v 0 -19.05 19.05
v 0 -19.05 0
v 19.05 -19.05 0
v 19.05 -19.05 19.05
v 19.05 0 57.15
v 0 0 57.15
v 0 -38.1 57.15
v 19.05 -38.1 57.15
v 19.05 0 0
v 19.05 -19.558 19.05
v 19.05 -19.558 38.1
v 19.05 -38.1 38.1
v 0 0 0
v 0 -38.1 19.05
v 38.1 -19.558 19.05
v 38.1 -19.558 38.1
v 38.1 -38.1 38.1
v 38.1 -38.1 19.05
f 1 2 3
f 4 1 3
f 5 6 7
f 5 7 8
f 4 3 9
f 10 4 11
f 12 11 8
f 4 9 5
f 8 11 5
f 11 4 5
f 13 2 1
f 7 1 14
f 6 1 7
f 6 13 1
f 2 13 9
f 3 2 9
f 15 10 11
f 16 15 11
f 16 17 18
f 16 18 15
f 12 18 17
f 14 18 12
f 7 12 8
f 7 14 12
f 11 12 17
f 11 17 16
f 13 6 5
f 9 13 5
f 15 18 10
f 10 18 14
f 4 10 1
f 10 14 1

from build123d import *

# Parameters (mm, degrees)
F0_W     = 19.05
F0_H     = 19.05
F1_DEPTH = 57.15
F2_W     = 19.05
F2_H     = 38.1
F3_DEPTH = 19.05
F4_W     = 18.542
F4_H     = 19.05
F5_DEPTH = 19.05


# Not quite as in the source:
# - a feature names something its author has since deleted; it is built from what else it names


with BuildPart() as f1:
    # F0 (on Top) → F1 (new body)
    with BuildSketch(Plane.XY):
        with Locations((9.525, -9.525)):
            Rectangle(F0_W, F0_H)
    extrude(amount=F1_DEPTH)

    # F2 (on face) → F3 (join)
    with BuildSketch(Plane.XZ.offset(19.05)):
        with Locations((9.525, 38.1)):
            Rectangle(F2_W, F2_H)
    extrude(amount=F3_DEPTH)

    # F4 (on face) → F5 (join)
    with BuildSketch(Plane.YZ.offset(19.05)):
        with Locations((-28.829, 28.575)):
            Rectangle(F4_W, F4_H)
    extrude(amount=F5_DEPTH)


solid = f1.part
